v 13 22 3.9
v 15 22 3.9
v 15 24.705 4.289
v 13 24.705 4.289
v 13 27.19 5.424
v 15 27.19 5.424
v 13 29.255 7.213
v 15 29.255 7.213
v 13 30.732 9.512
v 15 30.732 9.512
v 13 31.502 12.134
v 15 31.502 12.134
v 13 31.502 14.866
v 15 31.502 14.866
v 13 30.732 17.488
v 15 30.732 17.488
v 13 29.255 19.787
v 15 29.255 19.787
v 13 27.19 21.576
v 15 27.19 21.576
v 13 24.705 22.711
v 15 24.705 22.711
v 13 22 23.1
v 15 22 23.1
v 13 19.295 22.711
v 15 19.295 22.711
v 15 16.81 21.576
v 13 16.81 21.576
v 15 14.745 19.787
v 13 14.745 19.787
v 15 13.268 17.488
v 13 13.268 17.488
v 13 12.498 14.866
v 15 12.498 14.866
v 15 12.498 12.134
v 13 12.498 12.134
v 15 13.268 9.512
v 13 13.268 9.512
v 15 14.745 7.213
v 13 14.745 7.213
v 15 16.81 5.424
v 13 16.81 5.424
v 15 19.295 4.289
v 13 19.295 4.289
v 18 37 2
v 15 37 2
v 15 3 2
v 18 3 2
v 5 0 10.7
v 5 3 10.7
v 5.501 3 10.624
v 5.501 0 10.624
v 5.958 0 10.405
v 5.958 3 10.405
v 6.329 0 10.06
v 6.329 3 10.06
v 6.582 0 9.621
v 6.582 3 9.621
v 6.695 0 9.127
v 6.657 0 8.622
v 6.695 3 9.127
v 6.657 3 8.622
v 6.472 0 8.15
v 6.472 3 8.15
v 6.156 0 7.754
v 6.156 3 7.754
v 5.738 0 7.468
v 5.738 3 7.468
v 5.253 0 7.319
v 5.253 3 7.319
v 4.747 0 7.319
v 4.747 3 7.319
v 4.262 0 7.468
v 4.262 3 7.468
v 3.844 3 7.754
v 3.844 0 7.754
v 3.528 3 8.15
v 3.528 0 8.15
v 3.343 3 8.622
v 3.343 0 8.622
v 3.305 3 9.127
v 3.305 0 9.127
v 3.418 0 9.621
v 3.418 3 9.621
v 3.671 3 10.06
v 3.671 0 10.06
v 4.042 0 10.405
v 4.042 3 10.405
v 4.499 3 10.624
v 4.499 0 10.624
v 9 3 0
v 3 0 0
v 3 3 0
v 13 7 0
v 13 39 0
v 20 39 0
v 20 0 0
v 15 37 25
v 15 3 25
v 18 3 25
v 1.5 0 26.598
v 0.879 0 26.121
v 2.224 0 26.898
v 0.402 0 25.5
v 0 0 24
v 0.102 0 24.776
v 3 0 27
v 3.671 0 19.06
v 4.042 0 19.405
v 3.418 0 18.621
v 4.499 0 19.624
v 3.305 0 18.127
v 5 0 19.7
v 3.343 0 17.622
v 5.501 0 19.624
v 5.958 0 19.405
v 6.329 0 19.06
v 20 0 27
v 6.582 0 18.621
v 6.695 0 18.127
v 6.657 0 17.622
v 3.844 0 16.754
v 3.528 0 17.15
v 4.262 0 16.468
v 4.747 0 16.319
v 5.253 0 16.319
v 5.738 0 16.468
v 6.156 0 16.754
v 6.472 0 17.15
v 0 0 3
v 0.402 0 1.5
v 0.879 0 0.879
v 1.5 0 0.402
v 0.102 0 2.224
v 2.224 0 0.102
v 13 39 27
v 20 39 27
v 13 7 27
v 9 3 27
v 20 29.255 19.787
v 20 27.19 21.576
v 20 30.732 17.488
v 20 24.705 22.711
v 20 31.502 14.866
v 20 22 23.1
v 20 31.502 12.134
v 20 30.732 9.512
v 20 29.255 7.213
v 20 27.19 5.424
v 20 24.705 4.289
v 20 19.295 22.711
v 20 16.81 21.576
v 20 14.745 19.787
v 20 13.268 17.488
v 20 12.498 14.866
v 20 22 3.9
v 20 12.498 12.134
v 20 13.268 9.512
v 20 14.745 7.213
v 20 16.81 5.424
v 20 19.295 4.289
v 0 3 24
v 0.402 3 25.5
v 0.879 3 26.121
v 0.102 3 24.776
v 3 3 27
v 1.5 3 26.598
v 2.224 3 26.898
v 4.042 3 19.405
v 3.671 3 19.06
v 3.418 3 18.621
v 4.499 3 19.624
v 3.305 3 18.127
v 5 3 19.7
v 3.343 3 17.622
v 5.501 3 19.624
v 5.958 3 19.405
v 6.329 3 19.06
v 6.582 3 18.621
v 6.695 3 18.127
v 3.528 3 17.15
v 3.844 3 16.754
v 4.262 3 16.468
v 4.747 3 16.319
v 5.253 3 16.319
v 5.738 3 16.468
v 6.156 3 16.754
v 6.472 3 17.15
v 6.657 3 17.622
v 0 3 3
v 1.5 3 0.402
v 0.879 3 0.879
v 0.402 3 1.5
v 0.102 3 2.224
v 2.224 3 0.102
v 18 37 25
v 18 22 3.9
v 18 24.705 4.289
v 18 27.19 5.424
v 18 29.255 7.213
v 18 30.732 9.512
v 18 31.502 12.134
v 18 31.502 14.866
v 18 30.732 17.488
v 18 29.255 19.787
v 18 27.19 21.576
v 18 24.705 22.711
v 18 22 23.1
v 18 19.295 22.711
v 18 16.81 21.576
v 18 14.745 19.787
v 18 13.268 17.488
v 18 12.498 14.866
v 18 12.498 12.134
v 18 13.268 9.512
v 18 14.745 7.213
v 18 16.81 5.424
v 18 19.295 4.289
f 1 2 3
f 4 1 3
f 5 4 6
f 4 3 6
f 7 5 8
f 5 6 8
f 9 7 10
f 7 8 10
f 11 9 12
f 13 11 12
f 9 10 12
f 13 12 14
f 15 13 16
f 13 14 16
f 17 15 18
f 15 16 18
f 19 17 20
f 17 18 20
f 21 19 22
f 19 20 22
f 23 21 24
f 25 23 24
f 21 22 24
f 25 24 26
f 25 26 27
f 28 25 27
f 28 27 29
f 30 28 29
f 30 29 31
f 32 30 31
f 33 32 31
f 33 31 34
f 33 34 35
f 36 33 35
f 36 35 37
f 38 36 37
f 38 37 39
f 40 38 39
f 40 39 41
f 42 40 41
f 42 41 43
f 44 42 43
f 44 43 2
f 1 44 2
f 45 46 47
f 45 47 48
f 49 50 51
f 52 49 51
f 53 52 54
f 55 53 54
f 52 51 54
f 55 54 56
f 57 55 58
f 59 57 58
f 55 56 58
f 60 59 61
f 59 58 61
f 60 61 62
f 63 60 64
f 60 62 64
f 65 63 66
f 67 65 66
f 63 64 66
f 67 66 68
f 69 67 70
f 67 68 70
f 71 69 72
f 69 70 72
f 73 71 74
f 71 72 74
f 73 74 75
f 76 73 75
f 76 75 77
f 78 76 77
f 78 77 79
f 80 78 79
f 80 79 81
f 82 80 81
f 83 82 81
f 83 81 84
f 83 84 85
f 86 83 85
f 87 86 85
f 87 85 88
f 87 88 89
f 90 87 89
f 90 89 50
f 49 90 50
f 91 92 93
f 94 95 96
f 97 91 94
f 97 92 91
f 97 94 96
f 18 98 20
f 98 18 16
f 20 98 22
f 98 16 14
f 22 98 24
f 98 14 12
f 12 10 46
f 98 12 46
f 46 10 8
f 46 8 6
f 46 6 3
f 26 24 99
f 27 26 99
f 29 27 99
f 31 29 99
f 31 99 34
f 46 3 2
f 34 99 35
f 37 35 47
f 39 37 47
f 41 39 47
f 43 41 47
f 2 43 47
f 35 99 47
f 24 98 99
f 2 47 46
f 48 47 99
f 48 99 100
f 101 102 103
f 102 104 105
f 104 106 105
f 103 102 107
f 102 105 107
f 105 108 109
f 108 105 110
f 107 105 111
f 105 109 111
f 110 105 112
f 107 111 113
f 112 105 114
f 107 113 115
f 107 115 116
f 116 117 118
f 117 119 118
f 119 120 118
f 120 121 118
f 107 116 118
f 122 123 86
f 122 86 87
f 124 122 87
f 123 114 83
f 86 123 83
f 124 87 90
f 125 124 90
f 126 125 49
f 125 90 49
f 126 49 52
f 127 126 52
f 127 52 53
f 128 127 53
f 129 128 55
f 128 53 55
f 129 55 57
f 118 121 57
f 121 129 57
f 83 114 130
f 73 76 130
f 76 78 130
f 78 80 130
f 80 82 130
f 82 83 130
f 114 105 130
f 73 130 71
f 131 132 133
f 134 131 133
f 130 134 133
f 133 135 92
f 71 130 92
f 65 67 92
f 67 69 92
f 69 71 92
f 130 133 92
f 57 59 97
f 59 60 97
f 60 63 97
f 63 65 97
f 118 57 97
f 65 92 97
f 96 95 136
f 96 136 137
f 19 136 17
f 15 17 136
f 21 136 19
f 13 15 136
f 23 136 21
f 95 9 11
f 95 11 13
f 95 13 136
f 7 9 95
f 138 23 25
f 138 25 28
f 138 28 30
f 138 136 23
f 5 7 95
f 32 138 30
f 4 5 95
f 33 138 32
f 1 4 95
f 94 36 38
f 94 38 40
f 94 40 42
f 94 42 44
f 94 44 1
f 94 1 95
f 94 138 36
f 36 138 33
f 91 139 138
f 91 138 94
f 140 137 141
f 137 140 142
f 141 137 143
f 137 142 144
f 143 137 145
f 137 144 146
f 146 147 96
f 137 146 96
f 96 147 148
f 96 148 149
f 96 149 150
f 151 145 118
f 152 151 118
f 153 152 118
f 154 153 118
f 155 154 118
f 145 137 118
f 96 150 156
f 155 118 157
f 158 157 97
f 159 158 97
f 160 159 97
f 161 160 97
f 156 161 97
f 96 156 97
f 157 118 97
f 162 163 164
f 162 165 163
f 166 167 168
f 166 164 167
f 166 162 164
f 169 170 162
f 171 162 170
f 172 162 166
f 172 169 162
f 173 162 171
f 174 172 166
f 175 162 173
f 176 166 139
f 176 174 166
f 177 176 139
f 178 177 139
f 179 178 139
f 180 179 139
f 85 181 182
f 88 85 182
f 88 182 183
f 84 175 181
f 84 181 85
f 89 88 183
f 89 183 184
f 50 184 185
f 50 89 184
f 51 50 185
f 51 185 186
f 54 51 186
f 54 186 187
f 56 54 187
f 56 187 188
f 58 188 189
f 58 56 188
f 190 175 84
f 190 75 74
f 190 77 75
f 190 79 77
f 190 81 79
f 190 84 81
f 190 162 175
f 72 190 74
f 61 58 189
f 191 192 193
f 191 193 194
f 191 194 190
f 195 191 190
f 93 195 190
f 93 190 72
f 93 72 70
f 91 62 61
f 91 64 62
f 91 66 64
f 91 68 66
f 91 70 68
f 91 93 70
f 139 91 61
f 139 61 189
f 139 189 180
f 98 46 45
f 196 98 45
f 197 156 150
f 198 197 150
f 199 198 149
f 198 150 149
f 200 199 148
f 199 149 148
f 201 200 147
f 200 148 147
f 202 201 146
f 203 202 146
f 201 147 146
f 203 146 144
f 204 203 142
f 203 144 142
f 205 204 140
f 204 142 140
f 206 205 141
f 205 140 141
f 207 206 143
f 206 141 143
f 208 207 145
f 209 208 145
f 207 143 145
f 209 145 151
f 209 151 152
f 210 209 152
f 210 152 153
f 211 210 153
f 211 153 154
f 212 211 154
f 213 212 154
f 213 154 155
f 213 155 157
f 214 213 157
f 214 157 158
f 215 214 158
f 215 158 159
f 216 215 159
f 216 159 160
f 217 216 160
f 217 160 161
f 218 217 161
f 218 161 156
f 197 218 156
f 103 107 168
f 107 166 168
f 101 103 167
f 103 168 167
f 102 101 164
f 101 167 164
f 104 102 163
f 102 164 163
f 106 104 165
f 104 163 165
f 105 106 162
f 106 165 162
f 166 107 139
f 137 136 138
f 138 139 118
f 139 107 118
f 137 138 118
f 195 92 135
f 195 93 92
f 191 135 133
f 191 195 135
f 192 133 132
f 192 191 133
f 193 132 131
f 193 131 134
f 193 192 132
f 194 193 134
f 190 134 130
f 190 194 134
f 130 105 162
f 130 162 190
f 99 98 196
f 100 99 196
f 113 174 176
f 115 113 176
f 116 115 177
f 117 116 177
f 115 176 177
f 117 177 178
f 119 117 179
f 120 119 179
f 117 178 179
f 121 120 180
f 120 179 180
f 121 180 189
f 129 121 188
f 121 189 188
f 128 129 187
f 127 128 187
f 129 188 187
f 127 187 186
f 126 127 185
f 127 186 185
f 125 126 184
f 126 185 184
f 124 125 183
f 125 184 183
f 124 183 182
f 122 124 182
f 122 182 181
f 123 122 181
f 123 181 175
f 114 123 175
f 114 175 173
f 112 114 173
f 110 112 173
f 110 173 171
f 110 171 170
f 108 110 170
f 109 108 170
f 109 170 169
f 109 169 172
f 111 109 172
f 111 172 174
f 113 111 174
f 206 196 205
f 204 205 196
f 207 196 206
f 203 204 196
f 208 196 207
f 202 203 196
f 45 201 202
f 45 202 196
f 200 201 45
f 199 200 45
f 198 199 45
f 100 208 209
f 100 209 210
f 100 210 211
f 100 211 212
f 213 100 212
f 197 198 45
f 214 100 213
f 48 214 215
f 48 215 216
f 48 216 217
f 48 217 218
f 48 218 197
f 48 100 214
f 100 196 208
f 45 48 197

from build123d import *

# Parameters (mm, degrees)
SKETCH_1_W          = 20
SKETCH_1_H          = 27
EXTRUDE_1_DEPTH     = 3
SKETCH_2_W          = 2
SKETCH_2_H          = 27
EXTRUDE_2_DEPTH     = 34
SKETCH_3_W          = 2
SKETCH_3_H          = 27
EXTRUDE_3_DEPTH     = 34
SKETCH_4_W          = 3
SKETCH_4_H          = 2
EXTRUDE_4_DEPTH     = 34
SKETCH_6_W          = 7
SKETCH_6_H          = 27
EXTRUDE_5_DEPTH     = 2
SKETCH_7_R          = 1.7
CUT_EXTRUDE_1_DEPTH = 50.244289009
SKETCH_8_R          = 9.6
CUT_EXTRUDE_2_DEPTH = 50
CHAMFER_1_SIZE      = 4
FILLET_1_R          = 3


with BuildPart() as part:
    # 草图1 → 凸台-拉伸1 (new body)
    with BuildSketch(Plane(origin=(0, 0, 0), x_dir=(1, 0, 0), z_dir=(0, 1, 0))):
        with Locations((10, -13.5)):
            Rectangle(SKETCH_1_W, SKETCH_1_H)
    extrude(amount=EXTRUDE_1_DEPTH)

    # 草图2 → 凸台-拉伸2 (add)
    with BuildSketch(Plane(origin=(0, 3, 0), x_dir=(1, 0, 0), z_dir=(0, 1, 0))):
        with Locations((19, -13.5)):
            Rectangle(SKETCH_2_W, SKETCH_2_H)
    extrude(amount=EXTRUDE_2_DEPTH)

    # 草图3 → 凸台-拉伸3 (add)
    with BuildSketch(Plane(origin=(0, 3, 0), x_dir=(1, 0, 0), z_dir=(0, 1, 0))):
        with Locations((14, -13.5)):
            Rectangle(SKETCH_3_W, SKETCH_3_H)
    extrude(amount=EXTRUDE_3_DEPTH)

    # 草图4 → 凸台-拉伸4 (add)
    with BuildSketch(Plane(origin=(0, 3, 0), x_dir=(1, 0, 0), z_dir=(0, 1, 0))):
        with Locations((16.5, -1)):
            Rectangle(SKETCH_4_W, SKETCH_4_H)
        with Locations((16.5, -26)):
            Rectangle(SKETCH_4_W, SKETCH_4_H)
    extrude(amount=EXTRUDE_4_DEPTH)

    # 草图6 → 凸台-拉伸5 (add)
    with BuildSketch(Plane(origin=(0, 37, 0), x_dir=(1, 0, 0), z_dir=(0, 1, 0))):
        with Locations((16.5, -13.5)):
            Rectangle(SKETCH_6_W, SKETCH_6_H)
    extrude(amount=EXTRUDE_5_DEPTH)

    # 草图7 → 切除-拉伸1 (cut, through all)
    with BuildSketch(Plane(origin=(0, 3, 0), x_dir=(1, 0, 0), z_dir=(0, 1, 0))):
        with Locations(Location((5, -9, 0), (0, 0, 270))):
            Circle(SKETCH_7_R)
        with Locations(Location((5, -18, 0), (0, 0, 270))):
            Circle(SKETCH_7_R)
    extrude(amount=-CUT_EXTRUDE_1_DEPTH, mode=Mode.SUBTRACT)

    # 草图8 → 切除-拉伸2 (cut)
    with BuildSketch(Plane(origin=(20, 0, 0), x_dir=(0, 0, -1), z_dir=(1, 0, 0))):
        with Locations((-13.5, 22)):
            Circle(SKETCH_8_R)
    extrude(amount=-CUT_EXTRUDE_2_DEPTH, mode=Mode.SUBTRACT)

    # 倒角1
    chamfer_1_edges = [part.edges().sort_by_distance(p)[0] for p in [
        (13, 3, 13.5),
    ]]
    chamfer(chamfer_1_edges, length=CHAMFER_1_SIZE)

    # 圆角1
    fillet_1_edges = [part.edges().sort_by_distance(p)[0] for p in [
        (0, 1.5, 0),
        (0, 1.5, 27),
    ]]
    fillet(fillet_1_edges, radius=FILLET_1_R)


solid = part.part
